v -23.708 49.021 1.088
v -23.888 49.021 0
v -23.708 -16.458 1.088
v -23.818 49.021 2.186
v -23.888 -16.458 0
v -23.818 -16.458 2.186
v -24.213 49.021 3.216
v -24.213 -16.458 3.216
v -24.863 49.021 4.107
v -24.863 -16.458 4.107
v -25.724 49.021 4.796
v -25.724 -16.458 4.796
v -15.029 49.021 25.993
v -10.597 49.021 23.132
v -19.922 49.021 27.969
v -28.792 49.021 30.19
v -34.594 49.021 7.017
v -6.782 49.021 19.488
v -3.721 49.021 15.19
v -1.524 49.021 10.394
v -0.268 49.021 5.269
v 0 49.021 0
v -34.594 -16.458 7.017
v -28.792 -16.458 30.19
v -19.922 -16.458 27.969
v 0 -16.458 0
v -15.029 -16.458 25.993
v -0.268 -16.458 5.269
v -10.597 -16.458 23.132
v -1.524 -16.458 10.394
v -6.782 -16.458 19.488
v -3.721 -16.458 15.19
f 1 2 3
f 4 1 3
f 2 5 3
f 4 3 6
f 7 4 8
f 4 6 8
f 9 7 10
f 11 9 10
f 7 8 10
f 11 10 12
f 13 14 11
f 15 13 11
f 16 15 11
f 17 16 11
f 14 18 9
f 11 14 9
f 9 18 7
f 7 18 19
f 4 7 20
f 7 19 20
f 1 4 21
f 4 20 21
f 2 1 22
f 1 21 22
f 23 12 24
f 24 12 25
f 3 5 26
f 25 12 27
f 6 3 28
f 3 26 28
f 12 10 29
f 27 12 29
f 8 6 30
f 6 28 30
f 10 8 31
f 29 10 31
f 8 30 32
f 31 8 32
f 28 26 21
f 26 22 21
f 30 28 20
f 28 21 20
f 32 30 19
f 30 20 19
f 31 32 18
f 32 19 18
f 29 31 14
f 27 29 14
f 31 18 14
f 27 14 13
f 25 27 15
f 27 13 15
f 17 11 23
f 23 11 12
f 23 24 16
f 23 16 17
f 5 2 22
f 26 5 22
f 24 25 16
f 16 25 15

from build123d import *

# Parameters (mm, degrees)
F1_W     = 23.8884352148
F1_H     = 65.4788929969
F3_DEPTH = 9.144


with BuildPart() as f2:
    # F2: sweep along a path in F0
    with BuildLine(Plane.XZ) as f2_path:
        ThreePointArc((0, 0), (-5.1494897323, 17.4114904643), (-19.9215319008, 27.9691424221))
    # F1 (on Top) → F2 (sweep)
    with BuildSketch(Plane.XY):
        with Locations((-11.9442176074, 16.281622462)):
            Rectangle(F1_W, F1_H)
    sweep(path=f2_path.line)

    # F3 (add): a face of the model
    f3_faces = [f2.faces().sort_by_distance(p)[0] for p in [
        (-22.82294692, 16.281622462, 16.3826794096),
    ]]
    extrude(f3_faces, amount=F3_DEPTH)


solid = f2.part
